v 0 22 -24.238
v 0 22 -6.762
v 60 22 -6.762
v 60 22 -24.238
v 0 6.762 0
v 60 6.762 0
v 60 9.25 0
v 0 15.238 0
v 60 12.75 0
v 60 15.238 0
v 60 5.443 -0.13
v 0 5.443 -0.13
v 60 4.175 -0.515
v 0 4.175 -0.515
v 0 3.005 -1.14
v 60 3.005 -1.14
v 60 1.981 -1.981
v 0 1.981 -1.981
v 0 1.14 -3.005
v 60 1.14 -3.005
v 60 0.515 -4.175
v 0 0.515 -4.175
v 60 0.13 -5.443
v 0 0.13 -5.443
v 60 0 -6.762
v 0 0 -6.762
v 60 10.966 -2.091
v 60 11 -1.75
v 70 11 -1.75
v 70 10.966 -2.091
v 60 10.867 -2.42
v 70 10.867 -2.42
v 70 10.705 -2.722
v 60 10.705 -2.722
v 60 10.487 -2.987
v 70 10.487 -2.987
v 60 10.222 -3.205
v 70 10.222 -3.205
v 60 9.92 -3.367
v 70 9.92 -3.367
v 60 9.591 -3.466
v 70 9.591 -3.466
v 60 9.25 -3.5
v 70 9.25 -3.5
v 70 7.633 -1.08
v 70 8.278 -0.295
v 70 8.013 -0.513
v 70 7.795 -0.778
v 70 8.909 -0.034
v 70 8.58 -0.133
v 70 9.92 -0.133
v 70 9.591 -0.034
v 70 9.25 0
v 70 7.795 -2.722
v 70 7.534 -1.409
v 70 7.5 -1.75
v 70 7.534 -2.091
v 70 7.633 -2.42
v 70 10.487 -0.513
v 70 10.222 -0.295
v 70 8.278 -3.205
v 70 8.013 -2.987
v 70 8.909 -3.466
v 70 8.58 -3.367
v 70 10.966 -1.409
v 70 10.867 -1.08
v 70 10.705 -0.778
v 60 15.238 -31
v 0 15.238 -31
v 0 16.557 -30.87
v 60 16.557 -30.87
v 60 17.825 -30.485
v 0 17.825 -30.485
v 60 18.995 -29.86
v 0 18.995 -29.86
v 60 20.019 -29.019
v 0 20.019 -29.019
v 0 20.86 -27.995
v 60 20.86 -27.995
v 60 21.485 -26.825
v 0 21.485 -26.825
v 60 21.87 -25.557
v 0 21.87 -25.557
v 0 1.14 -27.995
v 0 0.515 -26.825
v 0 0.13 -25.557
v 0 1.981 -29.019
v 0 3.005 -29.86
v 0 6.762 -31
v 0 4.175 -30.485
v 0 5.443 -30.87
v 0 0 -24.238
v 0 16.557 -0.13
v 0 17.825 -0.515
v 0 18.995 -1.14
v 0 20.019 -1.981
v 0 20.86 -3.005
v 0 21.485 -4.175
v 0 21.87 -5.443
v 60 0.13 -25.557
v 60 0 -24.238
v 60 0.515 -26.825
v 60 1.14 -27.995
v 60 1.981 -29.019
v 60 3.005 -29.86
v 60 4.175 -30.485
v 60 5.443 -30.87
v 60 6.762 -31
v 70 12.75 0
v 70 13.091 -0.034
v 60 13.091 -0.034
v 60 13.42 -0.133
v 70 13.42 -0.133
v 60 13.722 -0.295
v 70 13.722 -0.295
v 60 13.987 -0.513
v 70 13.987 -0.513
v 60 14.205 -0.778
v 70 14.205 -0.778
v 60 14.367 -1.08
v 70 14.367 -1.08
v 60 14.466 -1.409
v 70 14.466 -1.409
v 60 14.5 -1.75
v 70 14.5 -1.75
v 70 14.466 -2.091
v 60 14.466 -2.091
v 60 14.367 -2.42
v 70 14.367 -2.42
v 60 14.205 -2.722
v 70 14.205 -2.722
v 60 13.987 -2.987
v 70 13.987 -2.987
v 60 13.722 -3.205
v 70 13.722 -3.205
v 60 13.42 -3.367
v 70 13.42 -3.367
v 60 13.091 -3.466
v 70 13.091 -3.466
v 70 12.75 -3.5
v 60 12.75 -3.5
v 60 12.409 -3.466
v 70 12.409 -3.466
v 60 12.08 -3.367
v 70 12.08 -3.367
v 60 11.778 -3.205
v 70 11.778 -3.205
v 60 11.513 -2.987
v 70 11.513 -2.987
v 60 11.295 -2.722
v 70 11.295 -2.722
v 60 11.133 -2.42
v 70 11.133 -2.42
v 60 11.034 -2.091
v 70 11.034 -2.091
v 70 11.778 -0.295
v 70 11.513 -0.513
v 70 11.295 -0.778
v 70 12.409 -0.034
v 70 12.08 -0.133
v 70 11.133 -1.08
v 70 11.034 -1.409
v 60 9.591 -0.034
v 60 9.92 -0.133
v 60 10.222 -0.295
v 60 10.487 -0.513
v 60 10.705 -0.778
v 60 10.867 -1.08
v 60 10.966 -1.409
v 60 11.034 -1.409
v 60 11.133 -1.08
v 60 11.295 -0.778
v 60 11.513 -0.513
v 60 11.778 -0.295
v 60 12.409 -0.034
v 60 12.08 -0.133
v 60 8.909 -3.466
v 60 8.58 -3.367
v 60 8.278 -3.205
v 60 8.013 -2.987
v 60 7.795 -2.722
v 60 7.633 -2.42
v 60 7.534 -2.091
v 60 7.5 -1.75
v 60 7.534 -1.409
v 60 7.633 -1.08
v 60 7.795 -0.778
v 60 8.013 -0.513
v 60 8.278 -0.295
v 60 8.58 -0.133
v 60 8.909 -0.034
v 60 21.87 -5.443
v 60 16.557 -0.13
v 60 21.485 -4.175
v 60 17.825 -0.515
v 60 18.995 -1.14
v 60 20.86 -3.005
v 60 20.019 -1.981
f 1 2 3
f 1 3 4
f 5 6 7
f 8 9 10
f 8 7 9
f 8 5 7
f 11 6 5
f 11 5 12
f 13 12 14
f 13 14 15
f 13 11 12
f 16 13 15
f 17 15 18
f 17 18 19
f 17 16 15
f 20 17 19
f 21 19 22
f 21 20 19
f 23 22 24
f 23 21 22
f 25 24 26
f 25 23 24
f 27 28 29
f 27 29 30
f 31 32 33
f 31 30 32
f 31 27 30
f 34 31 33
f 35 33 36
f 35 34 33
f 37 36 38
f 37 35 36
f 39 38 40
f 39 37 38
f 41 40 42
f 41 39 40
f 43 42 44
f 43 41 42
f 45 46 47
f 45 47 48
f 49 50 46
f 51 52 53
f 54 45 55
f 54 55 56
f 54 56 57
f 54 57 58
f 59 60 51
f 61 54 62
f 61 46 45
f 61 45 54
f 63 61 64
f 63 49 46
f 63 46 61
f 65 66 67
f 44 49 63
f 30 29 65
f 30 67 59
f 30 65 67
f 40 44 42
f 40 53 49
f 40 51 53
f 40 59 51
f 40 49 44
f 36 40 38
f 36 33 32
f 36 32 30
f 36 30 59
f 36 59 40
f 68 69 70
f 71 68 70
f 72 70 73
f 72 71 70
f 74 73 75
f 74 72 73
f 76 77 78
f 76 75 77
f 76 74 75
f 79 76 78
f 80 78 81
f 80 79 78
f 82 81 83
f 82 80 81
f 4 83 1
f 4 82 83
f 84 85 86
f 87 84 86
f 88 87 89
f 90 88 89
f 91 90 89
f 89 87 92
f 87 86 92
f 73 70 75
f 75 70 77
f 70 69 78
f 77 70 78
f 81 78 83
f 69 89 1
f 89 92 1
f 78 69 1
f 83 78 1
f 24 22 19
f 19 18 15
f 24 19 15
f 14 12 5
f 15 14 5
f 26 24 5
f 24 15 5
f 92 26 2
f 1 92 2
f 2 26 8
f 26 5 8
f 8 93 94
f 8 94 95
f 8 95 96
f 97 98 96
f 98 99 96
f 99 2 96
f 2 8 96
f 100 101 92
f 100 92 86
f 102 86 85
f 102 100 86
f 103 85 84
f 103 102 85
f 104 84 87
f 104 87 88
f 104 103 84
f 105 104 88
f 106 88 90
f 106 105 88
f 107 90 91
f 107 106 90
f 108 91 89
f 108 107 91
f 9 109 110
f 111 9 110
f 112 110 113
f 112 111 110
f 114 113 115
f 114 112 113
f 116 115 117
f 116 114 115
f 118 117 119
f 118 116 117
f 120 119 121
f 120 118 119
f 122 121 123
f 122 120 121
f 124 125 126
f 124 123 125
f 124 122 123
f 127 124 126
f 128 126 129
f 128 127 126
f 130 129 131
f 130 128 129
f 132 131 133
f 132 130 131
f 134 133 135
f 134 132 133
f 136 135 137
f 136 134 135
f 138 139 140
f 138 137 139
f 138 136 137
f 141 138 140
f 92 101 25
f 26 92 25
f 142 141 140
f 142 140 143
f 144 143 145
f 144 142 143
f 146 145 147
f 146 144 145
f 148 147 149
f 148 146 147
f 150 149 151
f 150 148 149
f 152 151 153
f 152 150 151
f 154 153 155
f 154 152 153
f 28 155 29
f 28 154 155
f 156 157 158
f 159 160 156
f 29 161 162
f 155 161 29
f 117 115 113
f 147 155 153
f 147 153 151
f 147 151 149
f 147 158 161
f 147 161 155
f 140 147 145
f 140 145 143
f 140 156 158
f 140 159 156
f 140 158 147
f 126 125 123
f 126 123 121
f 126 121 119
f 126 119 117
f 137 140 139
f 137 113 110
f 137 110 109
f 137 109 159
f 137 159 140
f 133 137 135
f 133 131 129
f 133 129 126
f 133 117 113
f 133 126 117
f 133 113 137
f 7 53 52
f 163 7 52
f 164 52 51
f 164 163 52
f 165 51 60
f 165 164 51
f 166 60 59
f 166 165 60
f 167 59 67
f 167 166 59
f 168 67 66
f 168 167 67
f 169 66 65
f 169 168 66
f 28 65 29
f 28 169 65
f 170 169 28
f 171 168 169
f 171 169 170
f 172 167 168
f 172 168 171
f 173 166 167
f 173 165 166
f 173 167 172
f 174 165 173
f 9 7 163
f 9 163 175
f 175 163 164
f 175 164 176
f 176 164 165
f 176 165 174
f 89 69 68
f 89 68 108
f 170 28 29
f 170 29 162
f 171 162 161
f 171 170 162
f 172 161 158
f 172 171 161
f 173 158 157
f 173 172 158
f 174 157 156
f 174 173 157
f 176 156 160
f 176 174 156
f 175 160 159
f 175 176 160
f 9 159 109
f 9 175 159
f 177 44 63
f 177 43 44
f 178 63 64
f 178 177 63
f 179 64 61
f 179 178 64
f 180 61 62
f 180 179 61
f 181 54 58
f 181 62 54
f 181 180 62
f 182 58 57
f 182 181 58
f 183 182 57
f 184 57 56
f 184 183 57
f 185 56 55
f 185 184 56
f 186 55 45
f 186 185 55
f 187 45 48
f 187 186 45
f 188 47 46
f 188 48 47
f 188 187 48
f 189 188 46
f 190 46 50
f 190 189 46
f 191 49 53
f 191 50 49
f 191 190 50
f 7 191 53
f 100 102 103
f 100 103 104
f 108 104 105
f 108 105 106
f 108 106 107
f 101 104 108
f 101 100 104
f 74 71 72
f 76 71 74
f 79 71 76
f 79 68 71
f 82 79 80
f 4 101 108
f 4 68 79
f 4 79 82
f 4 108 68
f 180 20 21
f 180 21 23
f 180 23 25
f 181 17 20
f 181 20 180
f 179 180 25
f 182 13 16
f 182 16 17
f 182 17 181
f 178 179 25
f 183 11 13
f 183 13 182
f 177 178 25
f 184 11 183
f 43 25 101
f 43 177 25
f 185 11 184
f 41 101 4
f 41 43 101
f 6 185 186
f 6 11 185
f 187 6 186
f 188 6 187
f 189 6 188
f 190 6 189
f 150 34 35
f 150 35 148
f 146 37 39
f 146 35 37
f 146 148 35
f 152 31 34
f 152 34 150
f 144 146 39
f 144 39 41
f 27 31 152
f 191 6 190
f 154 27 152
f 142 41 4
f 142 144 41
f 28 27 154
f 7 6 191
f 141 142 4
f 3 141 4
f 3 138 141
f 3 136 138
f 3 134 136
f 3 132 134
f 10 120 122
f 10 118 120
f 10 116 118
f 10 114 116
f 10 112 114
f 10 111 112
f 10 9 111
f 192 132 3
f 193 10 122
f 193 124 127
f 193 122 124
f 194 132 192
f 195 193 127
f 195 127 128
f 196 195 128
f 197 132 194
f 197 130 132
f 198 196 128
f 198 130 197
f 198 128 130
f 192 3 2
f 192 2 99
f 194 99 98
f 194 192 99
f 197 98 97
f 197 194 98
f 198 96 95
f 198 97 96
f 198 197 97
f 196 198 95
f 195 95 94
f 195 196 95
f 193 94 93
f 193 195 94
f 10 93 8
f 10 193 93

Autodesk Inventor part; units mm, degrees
ref_plane "YZ Plane" through (0, 0, 0) normal (1, 0, 0) x (0, 1, 0)
ref_plane "XZ Plane" through (0, 0, 0) normal (0, 1, 0) x (-1, 0, 0)
ref_plane "XY Plane" through (0, 0, 0) normal (0, 0, 1) x (1, 0, 0)
sketch "Sketch1" plane through (0, 0, 0) normal (1, 0, 0) x (0, 1, 0)
  line L0 (0, 0) -> (22, 0)
  line L1 (22, 0) -> (22, -31)
  line L2 (22, -31) -> (0, -31)
  line L3 (0, -31) -> (0, 0)
  dimension "d0" = 22
  dimension "d1" = 31
extrude "Extrusion1" add sketch "Sketch1" along normal blind 60
sketch "Sketch2" plane through (60, 0, 0) normal (1, 0, 0) x (0, 0, -1)
  circle A0 centre (1.75, 9.25) radius 1.75
  circle A1 centre (1.75, 12.75) radius 1.75
  line L0 (1.75, 9.25) -> (1.75, 12.75) construction
  line L1 (0, 22) -> (0, 0) projected
  point P0 (1.75, 11)
  point P1 (0, 11)
  point P2 (1.75, 11)
  dimension "d4" = 3.5
extrude "Extrusion2" add sketch "Sketch2" along normal blind 10 contours A0 | A1
fillet "Fillet1" radius 6.7625 4 edges at (30, 0, 0) (30, 22, 0) (30, 0, -31) (30, 22, -31)
properties part number "Battery"
